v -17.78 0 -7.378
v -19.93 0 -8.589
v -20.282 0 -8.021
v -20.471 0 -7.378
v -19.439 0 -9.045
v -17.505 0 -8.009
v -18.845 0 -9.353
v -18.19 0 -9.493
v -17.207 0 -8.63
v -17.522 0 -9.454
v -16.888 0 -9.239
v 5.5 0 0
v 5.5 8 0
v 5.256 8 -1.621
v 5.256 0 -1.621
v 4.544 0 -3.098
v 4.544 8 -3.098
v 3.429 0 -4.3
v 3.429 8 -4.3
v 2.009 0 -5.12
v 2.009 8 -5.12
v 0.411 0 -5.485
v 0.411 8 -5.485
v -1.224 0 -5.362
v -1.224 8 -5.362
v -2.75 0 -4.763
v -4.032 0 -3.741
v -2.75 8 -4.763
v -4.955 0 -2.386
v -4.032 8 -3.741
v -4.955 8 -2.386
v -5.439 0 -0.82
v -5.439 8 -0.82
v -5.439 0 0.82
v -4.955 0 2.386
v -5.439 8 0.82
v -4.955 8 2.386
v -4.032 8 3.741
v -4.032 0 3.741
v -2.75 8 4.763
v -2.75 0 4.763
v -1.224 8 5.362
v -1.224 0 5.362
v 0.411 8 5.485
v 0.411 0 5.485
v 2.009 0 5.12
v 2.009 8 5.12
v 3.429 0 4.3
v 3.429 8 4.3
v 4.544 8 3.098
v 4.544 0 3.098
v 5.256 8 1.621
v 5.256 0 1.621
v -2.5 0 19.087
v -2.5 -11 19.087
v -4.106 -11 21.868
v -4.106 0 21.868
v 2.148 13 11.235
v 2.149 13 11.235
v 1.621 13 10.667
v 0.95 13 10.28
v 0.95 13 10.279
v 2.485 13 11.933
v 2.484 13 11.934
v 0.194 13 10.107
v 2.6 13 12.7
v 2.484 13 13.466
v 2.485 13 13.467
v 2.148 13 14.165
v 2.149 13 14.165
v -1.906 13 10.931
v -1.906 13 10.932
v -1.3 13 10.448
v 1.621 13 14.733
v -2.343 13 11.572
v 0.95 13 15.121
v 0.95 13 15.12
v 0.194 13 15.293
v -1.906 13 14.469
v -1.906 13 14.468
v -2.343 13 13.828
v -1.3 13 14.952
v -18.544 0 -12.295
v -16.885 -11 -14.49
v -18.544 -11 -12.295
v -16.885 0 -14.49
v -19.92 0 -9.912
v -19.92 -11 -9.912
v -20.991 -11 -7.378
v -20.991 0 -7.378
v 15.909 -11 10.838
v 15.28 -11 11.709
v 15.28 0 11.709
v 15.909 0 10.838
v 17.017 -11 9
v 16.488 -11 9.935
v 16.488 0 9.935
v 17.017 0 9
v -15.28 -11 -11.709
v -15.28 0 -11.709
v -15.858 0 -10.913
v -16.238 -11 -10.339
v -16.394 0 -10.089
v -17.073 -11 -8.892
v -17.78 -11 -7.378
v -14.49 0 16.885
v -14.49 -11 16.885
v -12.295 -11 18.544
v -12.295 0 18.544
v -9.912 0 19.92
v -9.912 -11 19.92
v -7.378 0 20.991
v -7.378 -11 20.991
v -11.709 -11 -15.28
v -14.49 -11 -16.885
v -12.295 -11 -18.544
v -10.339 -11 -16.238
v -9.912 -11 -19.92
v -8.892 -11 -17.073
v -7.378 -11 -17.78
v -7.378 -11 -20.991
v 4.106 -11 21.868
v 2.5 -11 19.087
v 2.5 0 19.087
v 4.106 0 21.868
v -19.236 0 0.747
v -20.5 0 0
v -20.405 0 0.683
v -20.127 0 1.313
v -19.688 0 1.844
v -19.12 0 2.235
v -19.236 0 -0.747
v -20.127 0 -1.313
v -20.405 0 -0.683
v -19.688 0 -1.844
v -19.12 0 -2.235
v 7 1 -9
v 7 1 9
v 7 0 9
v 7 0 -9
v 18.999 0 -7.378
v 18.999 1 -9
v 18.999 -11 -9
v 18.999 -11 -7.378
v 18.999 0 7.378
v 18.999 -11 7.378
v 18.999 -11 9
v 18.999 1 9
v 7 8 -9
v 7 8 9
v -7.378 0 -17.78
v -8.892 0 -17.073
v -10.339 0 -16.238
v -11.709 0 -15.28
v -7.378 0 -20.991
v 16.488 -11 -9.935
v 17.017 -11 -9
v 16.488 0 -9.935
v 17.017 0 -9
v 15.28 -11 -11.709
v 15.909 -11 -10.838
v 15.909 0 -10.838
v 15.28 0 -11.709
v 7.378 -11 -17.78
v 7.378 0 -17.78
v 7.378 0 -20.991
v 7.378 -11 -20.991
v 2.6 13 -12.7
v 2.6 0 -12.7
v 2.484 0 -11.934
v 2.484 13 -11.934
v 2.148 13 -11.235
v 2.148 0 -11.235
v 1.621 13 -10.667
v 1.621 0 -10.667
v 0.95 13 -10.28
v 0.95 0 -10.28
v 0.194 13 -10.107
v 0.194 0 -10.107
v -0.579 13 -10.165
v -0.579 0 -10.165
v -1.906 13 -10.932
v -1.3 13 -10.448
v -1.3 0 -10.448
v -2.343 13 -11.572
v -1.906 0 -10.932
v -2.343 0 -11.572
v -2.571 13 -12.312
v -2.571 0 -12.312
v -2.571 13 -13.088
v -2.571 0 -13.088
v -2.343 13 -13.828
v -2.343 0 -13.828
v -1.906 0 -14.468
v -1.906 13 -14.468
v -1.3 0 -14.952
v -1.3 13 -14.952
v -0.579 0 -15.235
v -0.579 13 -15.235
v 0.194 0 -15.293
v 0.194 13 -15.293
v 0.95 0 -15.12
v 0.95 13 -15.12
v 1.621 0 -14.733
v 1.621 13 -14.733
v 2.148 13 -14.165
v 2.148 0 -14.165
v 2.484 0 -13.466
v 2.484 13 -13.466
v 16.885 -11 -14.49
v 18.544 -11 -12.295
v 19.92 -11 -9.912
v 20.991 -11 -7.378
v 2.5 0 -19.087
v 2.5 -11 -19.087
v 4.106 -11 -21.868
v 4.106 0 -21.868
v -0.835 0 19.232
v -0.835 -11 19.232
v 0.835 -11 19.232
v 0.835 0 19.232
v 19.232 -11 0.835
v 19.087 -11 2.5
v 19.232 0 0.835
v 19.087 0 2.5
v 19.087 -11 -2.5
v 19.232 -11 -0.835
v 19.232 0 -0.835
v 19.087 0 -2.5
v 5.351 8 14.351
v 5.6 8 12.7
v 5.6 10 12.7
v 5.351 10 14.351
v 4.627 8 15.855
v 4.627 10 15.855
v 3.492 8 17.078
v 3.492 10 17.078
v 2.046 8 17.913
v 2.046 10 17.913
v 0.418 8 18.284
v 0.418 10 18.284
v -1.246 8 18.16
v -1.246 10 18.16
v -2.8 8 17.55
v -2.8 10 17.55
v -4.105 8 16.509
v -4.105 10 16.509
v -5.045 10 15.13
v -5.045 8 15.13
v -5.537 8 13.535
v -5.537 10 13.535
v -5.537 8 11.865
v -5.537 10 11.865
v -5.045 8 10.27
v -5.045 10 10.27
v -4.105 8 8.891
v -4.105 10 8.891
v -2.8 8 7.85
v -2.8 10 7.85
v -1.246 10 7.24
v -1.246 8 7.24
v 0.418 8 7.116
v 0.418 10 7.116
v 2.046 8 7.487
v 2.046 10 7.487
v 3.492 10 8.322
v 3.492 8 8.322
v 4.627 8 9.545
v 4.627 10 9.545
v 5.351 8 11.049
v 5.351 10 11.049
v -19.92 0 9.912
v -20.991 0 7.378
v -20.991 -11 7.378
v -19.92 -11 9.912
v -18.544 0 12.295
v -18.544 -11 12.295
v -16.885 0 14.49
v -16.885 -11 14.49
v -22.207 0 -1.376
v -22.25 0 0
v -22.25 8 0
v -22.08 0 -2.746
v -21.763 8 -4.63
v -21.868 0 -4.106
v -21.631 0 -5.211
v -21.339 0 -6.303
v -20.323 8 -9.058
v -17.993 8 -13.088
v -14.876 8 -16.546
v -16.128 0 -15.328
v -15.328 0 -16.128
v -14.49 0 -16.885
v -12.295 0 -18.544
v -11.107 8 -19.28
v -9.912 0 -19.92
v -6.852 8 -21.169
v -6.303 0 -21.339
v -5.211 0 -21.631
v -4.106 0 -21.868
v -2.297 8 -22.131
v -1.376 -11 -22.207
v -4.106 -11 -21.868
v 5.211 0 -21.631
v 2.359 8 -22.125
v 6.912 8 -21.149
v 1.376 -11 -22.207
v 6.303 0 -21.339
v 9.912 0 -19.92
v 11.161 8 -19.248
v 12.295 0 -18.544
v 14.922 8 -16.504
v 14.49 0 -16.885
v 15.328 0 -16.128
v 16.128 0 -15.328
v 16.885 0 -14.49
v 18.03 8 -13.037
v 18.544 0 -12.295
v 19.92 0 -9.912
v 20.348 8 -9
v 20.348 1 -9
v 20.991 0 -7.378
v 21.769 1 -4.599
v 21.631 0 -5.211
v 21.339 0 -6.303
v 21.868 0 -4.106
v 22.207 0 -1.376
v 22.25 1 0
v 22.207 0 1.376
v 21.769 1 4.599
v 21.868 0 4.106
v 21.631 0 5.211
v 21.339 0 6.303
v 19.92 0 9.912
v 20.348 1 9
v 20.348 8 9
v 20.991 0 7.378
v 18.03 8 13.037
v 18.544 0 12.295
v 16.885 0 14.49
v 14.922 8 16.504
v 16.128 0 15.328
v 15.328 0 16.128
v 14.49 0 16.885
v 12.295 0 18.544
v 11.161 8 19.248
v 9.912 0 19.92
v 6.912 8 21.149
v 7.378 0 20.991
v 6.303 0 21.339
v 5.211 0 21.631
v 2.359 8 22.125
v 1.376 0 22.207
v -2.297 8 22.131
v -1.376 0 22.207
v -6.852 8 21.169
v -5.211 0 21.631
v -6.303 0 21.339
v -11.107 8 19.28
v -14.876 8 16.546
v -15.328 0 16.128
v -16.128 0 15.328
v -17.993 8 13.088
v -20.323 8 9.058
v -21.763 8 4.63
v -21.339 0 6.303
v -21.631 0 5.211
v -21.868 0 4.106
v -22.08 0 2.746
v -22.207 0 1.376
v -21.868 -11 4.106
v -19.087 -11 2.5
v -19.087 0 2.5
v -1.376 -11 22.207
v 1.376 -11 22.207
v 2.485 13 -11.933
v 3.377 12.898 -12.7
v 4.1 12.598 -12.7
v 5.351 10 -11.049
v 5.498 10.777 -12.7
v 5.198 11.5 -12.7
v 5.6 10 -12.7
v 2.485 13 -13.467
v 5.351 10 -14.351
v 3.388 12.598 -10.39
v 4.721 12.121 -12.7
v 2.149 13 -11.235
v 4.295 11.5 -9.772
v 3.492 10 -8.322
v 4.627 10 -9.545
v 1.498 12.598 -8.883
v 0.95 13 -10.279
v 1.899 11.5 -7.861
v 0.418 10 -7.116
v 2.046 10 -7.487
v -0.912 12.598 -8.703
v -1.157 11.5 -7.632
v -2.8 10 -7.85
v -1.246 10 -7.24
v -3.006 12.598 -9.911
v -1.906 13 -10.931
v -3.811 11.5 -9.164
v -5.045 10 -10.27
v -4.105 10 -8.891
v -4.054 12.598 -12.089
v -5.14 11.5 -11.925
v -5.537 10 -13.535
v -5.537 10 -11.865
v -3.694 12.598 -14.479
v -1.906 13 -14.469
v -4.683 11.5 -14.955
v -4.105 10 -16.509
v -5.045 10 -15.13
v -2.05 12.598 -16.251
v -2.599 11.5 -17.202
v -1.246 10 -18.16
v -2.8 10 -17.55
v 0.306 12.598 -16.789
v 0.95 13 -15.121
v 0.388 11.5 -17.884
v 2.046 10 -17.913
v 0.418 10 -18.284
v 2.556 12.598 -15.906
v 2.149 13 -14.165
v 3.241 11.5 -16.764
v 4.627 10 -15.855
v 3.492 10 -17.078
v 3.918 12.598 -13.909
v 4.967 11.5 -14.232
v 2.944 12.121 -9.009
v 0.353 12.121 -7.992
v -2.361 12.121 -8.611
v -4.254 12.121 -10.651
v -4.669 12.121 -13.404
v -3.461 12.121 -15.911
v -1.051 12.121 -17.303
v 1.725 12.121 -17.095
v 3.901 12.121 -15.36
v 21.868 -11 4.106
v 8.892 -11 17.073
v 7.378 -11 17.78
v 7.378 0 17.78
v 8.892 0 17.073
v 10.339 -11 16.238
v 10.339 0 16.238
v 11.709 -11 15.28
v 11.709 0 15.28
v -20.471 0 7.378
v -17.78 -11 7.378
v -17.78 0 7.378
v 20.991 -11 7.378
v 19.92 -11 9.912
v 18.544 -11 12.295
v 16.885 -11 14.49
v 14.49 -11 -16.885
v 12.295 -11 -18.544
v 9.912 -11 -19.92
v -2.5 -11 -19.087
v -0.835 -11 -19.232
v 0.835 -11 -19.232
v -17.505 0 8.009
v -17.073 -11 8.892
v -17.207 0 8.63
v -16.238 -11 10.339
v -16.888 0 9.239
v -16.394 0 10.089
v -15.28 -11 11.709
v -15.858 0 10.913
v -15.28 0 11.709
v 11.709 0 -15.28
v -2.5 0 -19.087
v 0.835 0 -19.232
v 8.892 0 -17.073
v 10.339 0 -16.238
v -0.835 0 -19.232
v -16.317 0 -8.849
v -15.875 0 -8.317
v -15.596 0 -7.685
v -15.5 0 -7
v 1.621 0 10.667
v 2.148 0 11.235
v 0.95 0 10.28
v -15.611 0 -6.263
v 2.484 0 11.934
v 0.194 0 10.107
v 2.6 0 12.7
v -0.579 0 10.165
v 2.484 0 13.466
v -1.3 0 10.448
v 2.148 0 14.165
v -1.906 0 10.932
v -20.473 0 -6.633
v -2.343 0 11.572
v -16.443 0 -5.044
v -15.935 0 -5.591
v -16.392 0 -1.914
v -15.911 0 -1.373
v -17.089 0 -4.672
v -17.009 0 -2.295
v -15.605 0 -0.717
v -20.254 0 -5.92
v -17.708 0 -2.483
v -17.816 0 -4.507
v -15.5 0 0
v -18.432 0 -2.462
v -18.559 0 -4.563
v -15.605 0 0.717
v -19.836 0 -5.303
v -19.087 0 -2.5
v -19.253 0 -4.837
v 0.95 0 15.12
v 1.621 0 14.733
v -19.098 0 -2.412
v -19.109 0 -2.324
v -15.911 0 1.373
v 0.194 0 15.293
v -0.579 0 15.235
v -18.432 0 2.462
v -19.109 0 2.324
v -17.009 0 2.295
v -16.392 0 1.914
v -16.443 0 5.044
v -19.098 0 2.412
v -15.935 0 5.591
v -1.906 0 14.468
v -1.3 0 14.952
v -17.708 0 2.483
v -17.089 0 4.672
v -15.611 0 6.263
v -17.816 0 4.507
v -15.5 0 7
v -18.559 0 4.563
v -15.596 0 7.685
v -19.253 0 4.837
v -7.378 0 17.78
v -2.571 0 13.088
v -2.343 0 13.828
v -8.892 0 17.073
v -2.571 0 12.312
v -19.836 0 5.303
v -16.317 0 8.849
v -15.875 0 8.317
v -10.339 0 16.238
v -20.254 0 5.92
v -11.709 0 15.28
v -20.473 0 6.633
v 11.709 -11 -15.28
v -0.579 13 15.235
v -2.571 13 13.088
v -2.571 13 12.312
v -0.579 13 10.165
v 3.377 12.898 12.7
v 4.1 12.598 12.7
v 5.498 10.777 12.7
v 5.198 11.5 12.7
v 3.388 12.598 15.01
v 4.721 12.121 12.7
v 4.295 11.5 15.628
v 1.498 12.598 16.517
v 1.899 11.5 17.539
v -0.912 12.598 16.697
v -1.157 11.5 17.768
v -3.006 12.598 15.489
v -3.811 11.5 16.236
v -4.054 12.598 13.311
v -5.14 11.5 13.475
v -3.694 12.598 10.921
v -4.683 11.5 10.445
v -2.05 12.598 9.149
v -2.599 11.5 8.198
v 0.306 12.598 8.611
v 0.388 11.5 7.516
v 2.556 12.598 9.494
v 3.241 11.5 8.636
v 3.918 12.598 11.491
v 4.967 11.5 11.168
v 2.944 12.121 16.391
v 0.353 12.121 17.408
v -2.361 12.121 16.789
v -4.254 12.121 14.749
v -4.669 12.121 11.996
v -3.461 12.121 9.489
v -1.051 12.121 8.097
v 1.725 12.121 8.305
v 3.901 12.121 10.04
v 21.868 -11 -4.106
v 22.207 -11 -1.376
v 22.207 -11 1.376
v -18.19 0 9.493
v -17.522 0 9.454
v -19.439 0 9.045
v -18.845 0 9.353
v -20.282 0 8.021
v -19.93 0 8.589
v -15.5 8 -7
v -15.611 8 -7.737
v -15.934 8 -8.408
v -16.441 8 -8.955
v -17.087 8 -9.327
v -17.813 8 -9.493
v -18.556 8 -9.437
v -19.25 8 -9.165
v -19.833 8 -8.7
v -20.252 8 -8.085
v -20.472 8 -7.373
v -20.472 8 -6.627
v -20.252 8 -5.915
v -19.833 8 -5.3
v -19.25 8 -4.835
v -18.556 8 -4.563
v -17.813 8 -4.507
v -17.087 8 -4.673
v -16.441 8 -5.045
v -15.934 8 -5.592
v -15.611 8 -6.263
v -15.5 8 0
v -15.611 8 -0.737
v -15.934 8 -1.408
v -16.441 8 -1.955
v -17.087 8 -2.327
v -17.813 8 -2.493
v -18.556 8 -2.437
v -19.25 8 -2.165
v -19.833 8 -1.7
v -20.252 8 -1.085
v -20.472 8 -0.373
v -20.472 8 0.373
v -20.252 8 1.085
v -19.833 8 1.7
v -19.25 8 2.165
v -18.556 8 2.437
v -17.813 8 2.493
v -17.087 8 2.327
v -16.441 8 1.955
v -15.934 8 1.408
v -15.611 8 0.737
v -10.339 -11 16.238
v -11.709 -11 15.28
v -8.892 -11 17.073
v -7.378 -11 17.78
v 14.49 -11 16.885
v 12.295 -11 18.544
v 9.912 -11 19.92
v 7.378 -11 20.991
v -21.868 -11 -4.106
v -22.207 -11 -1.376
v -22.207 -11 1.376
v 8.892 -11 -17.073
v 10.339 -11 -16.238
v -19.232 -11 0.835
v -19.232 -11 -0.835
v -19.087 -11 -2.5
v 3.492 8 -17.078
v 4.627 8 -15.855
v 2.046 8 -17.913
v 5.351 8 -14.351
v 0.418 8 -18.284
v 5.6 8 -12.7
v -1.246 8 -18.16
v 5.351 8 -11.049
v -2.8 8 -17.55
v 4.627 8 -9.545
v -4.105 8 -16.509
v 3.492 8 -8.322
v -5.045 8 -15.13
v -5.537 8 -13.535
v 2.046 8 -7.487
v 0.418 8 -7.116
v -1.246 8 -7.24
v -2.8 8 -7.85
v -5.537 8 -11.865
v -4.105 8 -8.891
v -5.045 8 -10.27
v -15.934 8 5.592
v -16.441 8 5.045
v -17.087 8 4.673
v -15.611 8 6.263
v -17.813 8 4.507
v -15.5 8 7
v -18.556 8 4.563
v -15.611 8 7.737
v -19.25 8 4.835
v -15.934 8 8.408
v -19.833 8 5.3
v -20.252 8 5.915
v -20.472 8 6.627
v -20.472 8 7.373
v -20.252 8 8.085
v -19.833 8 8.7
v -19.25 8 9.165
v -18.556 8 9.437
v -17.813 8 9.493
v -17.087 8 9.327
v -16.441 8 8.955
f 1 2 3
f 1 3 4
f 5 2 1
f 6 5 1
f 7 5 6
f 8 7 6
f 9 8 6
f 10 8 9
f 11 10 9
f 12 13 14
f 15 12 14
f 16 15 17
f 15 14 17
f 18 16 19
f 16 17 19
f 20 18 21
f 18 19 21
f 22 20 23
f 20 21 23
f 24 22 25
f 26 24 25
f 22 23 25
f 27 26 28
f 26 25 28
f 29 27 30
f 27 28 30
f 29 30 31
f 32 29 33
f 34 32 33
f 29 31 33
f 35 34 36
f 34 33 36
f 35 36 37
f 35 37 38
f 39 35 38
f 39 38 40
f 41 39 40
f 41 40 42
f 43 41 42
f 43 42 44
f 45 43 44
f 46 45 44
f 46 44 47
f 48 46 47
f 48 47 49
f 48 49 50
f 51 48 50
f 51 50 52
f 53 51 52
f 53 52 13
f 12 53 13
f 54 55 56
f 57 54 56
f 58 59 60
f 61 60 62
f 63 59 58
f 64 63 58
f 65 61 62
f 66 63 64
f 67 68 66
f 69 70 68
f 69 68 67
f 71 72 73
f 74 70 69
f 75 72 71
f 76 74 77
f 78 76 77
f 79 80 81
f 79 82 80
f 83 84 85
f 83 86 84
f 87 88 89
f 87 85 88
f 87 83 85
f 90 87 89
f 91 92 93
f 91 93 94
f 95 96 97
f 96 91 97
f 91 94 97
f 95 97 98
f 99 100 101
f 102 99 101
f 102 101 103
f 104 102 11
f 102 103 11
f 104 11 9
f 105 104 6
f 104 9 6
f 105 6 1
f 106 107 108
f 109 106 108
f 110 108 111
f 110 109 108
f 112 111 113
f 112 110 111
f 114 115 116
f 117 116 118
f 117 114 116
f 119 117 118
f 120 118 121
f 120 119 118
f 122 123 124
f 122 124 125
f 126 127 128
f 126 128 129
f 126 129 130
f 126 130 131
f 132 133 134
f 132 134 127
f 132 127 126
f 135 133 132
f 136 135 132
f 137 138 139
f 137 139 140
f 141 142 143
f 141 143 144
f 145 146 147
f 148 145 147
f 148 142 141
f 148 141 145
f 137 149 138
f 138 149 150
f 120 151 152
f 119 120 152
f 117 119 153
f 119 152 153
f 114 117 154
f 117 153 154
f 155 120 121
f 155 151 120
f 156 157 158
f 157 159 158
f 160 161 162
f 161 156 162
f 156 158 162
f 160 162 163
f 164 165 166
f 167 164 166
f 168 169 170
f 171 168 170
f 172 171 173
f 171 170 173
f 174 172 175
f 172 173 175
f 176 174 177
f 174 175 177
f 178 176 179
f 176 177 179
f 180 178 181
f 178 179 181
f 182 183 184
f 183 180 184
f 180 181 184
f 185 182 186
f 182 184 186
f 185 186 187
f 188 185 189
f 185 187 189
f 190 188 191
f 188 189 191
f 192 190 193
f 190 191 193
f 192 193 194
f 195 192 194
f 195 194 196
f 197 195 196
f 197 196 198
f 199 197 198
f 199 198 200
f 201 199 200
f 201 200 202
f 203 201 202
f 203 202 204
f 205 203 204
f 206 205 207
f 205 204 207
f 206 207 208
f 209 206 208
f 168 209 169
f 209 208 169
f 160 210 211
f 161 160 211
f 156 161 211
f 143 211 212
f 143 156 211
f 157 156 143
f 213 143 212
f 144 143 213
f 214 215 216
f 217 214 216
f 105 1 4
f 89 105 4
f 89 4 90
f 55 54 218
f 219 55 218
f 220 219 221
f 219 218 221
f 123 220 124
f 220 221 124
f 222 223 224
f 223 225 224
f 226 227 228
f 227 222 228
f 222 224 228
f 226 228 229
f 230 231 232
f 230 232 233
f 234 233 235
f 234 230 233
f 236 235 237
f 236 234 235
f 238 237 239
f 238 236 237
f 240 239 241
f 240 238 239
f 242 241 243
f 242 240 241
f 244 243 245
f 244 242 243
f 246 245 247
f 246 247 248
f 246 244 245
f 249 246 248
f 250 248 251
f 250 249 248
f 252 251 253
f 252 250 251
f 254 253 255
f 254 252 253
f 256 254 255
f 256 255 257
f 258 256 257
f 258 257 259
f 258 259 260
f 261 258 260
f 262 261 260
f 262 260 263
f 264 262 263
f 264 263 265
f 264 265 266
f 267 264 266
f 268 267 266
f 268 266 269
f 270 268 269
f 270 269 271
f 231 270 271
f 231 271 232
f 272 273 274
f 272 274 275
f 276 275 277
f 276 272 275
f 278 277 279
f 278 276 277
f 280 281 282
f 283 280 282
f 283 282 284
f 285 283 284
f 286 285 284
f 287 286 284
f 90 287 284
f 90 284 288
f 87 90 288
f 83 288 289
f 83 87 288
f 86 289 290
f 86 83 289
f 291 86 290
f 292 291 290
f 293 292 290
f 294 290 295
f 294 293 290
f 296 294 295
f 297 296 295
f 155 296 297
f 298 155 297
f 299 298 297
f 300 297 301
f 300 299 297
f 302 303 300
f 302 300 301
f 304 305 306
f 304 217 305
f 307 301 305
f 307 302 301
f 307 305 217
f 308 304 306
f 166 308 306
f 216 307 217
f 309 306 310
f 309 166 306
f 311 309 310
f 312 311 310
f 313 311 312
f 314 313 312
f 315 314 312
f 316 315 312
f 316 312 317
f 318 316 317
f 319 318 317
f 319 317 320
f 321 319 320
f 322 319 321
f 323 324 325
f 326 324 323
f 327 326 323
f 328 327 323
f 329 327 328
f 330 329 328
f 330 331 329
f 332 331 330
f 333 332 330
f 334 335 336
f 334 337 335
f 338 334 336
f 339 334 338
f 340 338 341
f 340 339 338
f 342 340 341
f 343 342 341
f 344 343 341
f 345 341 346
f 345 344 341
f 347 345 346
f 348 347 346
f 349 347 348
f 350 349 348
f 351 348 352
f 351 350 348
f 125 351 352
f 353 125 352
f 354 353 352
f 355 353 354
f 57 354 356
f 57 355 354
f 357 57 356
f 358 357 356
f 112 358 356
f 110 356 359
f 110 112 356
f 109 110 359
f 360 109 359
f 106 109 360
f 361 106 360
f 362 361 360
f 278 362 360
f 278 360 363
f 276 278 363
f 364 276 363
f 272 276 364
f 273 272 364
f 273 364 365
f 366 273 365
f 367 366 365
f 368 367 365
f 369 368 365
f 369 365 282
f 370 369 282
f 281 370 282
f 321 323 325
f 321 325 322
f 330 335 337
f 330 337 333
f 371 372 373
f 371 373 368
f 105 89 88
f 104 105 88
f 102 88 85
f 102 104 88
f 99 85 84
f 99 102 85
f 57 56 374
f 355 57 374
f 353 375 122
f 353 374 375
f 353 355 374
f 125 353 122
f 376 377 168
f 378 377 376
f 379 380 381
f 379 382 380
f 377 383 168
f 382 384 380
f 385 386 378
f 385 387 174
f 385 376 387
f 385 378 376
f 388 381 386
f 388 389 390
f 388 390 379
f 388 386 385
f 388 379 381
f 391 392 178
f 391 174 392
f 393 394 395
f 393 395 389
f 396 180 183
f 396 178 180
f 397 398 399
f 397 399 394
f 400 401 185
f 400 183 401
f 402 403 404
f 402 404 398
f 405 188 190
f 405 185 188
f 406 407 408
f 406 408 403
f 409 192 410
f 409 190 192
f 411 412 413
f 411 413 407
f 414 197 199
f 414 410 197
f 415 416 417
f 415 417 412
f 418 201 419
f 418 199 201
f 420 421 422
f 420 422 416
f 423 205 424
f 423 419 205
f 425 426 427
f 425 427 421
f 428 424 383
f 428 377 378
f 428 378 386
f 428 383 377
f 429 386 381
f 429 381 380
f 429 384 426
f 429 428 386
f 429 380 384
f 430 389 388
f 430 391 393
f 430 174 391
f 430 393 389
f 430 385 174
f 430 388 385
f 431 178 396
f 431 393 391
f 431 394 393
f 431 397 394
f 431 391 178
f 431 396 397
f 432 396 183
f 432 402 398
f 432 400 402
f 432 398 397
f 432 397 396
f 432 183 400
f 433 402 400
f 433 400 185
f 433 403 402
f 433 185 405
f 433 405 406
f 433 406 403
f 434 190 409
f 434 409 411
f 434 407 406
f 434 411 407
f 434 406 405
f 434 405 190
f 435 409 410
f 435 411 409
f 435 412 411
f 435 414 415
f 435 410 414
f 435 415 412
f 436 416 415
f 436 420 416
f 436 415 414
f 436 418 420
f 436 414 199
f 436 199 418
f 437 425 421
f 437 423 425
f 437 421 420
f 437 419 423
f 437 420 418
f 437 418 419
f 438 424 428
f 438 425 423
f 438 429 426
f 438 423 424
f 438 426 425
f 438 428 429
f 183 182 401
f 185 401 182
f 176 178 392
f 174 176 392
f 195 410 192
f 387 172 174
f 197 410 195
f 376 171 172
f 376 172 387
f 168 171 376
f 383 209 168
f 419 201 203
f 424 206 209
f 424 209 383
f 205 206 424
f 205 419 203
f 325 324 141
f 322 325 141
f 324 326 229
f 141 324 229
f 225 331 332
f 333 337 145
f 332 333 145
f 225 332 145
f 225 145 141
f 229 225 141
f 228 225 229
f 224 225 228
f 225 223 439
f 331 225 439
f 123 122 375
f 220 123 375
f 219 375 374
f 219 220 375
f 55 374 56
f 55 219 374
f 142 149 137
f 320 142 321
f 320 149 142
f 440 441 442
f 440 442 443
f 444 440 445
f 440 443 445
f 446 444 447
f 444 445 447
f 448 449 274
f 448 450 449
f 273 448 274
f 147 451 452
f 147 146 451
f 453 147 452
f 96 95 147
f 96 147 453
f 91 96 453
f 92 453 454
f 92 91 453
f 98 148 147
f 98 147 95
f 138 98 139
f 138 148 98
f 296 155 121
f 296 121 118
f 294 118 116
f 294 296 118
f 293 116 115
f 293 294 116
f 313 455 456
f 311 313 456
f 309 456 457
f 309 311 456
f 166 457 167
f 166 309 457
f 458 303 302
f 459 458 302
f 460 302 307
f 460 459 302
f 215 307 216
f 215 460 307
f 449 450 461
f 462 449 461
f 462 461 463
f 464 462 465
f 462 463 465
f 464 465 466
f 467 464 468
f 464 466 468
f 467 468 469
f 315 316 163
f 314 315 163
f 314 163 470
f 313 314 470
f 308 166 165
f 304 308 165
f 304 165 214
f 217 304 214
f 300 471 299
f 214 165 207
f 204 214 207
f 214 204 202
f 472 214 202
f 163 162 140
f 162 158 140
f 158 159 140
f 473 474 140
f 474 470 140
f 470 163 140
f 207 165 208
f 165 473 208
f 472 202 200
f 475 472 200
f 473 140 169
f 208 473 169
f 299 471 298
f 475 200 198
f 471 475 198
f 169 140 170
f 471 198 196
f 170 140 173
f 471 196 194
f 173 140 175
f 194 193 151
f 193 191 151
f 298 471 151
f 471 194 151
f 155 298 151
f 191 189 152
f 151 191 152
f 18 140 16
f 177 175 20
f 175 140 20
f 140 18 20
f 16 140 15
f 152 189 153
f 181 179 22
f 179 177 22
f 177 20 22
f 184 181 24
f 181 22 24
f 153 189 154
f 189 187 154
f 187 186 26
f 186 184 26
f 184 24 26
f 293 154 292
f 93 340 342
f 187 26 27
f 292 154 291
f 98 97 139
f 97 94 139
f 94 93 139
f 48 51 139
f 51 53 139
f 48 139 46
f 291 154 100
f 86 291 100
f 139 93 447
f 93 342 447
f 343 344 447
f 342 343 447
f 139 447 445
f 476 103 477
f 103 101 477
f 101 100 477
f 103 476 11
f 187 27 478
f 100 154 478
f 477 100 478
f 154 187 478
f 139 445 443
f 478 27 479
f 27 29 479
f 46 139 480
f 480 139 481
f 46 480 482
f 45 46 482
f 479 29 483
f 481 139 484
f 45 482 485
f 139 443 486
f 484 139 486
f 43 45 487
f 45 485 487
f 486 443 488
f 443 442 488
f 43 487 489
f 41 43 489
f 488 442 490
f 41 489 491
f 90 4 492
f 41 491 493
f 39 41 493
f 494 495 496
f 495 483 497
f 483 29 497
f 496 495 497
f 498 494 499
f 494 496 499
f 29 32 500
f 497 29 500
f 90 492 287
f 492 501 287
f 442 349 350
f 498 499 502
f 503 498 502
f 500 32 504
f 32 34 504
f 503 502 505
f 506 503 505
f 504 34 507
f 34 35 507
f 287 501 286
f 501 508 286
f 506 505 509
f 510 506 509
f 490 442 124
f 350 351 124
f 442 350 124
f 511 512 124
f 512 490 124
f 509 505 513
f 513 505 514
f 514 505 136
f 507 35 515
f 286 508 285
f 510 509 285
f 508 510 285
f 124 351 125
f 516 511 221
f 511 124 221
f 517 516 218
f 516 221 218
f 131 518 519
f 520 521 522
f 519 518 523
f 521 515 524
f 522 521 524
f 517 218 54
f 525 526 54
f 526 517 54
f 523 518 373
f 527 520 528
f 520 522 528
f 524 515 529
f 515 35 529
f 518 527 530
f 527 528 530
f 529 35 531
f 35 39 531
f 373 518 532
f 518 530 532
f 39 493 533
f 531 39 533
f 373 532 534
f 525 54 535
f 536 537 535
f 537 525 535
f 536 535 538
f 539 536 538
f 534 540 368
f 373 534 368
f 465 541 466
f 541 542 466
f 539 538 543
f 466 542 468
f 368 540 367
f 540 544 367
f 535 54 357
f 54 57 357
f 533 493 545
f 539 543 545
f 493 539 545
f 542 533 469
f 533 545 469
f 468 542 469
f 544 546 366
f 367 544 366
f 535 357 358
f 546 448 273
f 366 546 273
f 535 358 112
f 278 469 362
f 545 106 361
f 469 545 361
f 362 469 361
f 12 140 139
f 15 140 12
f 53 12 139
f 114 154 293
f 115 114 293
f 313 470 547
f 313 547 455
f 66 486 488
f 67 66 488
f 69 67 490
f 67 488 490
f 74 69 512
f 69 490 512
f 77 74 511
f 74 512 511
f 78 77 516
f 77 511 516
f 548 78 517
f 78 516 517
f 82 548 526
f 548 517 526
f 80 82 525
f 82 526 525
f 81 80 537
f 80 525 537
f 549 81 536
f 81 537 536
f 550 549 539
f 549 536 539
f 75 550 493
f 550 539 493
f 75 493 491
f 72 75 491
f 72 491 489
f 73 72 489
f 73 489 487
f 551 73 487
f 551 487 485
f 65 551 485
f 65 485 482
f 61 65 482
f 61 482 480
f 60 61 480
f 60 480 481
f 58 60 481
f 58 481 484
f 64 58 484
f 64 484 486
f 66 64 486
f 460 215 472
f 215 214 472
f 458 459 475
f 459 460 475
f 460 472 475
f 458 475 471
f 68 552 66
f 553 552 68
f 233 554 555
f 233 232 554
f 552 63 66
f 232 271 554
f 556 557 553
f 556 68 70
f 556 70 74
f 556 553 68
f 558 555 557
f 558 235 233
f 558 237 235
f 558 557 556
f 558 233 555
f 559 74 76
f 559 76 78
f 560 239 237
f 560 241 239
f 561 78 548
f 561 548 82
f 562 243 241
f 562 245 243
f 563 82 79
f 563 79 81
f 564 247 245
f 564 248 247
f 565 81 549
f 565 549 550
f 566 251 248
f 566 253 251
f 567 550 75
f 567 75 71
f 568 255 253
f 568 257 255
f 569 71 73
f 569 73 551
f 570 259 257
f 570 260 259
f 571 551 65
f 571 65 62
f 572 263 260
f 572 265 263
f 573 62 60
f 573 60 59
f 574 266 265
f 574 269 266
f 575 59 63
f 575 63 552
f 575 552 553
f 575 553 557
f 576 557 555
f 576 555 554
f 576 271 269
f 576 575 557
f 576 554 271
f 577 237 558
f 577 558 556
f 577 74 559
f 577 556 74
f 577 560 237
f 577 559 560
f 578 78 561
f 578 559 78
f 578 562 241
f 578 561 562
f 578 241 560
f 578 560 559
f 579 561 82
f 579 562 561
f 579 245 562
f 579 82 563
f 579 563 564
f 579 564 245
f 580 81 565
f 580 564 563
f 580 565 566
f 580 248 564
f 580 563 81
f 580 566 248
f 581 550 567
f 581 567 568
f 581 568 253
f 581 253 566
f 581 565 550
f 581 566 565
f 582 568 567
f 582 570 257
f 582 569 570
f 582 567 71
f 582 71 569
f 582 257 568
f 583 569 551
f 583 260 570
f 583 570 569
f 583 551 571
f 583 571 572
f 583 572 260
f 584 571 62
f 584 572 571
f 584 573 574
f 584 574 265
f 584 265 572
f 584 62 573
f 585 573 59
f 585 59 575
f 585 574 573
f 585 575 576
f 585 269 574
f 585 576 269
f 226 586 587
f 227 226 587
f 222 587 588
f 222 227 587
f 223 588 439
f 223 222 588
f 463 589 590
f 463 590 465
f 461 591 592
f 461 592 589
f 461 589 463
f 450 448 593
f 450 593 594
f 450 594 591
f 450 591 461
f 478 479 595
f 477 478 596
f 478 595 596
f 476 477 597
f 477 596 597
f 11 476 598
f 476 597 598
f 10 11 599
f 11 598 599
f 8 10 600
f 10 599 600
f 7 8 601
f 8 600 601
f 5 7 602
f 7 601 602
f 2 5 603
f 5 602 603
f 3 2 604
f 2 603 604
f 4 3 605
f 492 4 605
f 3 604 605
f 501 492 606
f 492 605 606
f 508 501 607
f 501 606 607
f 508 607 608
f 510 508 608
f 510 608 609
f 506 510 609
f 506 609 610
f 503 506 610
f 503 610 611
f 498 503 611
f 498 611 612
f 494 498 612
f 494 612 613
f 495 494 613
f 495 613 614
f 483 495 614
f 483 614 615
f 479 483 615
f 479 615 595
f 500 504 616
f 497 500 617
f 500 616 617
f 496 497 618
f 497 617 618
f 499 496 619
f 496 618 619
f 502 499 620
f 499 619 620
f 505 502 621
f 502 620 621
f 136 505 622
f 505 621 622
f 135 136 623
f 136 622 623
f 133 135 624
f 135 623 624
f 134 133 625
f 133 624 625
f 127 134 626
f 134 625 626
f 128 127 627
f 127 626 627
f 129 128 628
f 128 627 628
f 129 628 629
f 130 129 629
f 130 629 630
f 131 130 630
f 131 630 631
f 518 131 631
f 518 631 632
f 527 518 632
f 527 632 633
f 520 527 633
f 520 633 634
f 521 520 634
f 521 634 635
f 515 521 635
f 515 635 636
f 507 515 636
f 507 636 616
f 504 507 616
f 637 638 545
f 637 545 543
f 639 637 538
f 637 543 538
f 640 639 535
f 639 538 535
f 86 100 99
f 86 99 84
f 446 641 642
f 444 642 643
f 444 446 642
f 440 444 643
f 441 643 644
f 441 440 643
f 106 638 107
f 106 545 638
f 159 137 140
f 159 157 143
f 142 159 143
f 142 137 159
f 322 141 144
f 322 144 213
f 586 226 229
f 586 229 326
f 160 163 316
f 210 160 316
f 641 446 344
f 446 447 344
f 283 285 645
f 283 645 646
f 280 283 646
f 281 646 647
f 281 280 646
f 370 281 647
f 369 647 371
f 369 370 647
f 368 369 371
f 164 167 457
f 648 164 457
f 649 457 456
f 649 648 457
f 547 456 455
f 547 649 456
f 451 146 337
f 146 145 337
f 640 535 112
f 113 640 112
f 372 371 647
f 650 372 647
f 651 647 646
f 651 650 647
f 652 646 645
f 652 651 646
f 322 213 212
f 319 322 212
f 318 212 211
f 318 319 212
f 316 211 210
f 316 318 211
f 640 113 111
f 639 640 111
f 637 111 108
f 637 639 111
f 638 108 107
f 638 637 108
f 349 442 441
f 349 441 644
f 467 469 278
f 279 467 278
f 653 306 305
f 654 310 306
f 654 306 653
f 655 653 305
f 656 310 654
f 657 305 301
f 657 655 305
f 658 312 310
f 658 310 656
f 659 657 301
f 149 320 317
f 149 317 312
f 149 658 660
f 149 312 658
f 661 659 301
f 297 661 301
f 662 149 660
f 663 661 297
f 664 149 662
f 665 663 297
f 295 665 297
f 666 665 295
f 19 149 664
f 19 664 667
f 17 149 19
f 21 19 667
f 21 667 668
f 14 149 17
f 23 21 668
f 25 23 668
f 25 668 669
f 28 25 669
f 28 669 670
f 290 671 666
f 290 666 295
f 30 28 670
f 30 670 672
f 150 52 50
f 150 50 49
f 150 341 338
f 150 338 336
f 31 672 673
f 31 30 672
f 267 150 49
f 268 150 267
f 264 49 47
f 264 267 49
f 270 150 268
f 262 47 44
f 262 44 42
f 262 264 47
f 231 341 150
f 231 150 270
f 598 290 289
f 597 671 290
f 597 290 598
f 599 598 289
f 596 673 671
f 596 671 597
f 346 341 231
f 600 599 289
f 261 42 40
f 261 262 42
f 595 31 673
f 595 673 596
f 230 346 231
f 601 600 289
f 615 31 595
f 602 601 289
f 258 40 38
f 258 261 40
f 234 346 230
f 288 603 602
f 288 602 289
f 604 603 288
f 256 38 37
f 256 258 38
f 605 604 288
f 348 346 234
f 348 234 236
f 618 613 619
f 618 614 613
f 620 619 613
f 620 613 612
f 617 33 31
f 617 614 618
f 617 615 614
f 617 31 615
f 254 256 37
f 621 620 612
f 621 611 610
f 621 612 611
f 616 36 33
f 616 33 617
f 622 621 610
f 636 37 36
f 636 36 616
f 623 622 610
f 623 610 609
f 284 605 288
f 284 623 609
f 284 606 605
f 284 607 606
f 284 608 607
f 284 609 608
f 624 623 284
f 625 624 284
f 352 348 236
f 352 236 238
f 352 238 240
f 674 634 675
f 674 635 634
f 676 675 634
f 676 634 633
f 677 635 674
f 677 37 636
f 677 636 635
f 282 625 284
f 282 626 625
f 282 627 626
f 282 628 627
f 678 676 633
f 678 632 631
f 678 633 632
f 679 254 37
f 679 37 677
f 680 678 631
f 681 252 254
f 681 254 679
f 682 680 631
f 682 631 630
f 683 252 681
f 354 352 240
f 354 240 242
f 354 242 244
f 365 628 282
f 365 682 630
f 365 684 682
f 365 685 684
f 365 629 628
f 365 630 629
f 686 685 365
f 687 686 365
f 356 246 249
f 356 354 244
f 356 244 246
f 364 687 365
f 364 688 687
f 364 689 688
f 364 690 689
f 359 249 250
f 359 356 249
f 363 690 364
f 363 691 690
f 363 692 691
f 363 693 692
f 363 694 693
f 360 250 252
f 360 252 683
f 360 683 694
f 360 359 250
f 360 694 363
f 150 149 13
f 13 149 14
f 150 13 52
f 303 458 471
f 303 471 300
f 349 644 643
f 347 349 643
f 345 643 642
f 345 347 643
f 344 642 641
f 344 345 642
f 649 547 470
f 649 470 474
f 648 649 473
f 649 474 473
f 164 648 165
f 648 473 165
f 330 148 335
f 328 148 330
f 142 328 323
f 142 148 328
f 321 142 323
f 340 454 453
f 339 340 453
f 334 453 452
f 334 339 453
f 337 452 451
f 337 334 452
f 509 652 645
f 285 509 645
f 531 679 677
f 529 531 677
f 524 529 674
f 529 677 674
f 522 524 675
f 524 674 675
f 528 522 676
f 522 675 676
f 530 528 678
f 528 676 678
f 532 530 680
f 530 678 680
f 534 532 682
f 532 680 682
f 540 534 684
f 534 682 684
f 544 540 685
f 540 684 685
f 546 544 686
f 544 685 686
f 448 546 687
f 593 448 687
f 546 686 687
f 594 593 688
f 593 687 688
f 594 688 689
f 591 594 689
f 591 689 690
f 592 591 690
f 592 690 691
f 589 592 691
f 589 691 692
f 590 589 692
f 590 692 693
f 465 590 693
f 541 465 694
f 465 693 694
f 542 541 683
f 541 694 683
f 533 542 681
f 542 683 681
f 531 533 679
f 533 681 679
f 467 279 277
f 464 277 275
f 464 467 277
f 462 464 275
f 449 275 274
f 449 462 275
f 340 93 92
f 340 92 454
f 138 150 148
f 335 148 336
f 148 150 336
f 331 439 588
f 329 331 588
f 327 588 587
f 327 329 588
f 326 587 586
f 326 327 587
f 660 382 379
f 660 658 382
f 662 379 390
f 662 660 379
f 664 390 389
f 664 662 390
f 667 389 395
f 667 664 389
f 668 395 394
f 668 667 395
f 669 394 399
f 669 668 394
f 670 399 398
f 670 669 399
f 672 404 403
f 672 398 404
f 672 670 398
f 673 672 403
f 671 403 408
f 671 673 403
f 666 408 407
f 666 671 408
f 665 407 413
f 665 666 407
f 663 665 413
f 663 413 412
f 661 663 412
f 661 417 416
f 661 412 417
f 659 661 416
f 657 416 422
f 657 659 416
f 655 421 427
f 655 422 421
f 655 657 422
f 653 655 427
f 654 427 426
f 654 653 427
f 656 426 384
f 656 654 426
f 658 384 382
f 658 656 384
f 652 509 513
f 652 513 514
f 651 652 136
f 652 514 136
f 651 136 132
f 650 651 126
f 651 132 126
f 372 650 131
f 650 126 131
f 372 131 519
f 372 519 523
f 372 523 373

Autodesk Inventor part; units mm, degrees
ref_plane "YZ Plane" through (0, 0, 0) normal (1, 0, 0) x (0, 1, 0)
ref_plane "XZ Plane" through (0, 0, 0) normal (0, 1, 0) x (-1, 0, 0)
ref_plane "XY Plane" through (0, 0, 0) normal (0, 0, 1) x (1, 0, 0)
sketch "Sketch1" plane through (0, 0, 0) normal (0, 1, 0) x (-1, 0, 0)
  circle A0 centre (0, 0) radius 22.25
  dimension "d0" = 44.5
extrude "Extrusion1" add sketch "Sketch1" along normal blind 8
sketch "Sketch2" plane through (0, 8, 0) normal (0, 1, 0) x (1, 0, 0)
  circle A0 centre (0, 12.7) radius 2.6
  circle A1 centre (0, -12.7) radius 2.6
  point P0 (0, 0)
  dimension "d3" = 5.2
  dimension "d4" = 12.7
  dimension "d5" = 5.2
  dimension "d6" = 12.7
extrude "Extrusion2" cut sketch "Sketch2" against normal up to surface (8 mm away)
sketch "Sketch3" plane through (0, 8, 0) normal (0, 1, 0) x (1, 0, 0)
  circle A0 centre (0, 12.7) radius 2.6 projected
  circle A1 centre (0, 12.7) radius 2.6
  circle A2 centre (0, 12.7) radius 5.6
  point P0 (0, 0)
  dimension "d9" = 3
extrude "Extrusion3" add sketch "Sketch3" along normal blind 5
mirror "Mirror1" about plane through (0, 0, 0) normal (0, 0, 1) of "Extrusion3"
sketch "Sketch4" plane through (0, 0, 0) normal (0, -1, 0) x (1, 0, 0)
  circle A0 centre (0, 0) radius 22.25 projected
  circle A1 centre (0, 0) radius 19.25
  circle A2 centre (0, 0) radius 22.25
  line L0 (2.5, -19.087) -> (-2.5, -19.087) construction
  line L1 (2.5, -19.087) -> (7.5, -19.087) construction
  line L2 (-2.5, -19.087) -> (-4.1056, -21.8679)
  line L3 (-2.5, -19.087) -> (0.7112, -19.087) construction
  line L4 (2.5, -19.087) -> (4.1056, -21.8679)
  line L5 (2.5, -19.087) -> (5.7112, -19.087) construction
  point P0 (4.1056, -21.8679)
  point P1 (-4.1056, -21.8679)
  dimension "d17" = 3
  dimension "d18" = 5
  dimension "d19" = 180
  dimension "d20" = 120
  dimension "d21" = 60
extrude "Extrusion5" add sketch "Sketch4" along normal blind 11 contours L2 A1 L4 A0 picked at (0.2785, -21.2156)
pattern_circular "Circular Pattern1" count 12 over 360 about axis through (0, -10, 0) along (0, 1, 0) of "Extrusion5"
fillet "Fillet1" radius 3 2 edges at (-5.6, 13, -12.7) (-5.6, 13, 12.7)
sketch "Sketch6" plane through (0, 8, 0) normal (0, 1, 0) x (1, 0, 0)
  circle A0 centre (0, 0) radius 22.25 projected
  circle A1 centre (0, 0) radius 22.25
  line L0 (7, 9) -> (7, -9)
  line L1 (7, 9) -> (25, 9) construction
  line L2 (7, 9) -> (20.3485, 9)
  line L3 (7, -9) -> (20.3485, -9)
  point P0 (7, 0)
  dimension "d29" = 18
  dimension "d30" = 90
  dimension "d56" = 7
extrude "Extrusion6" cut sketch "Sketch6" against normal blind 7 contours A0 L3 L0 L2 picked at (12.0833, 0)
sketch "Sketch7" plane through (0, 8, 0) normal (0, 1, 0) x (1, 0, 0)
  circle A0 centre (0, 0) radius 19.25 construction
  arc A1 (20.3485, 9) -> (20.3485, -9) centre (0, 0) ccw construction
  circle A2 centre (3, 7) radius 2.5
  arc A3 (4.1056, 21.8679) -> (-4.1056, 21.8679) centre (0, 0) ccw construction
  line L0 (0, 22.25) -> (0, -22.25) construction
  arc A4 (-4.1056, -21.8679) -> (4.1056, -21.8679) centre (0, 0) ccw construction
  line L1 (22.25, 0) -> (-22.25, 0) construction
  arc A5 (-21.8679, 4.1056) -> (-21.8679, -4.1056) centre (0, 0) ccw construction
  line L2 (7, -9) -> (7, 9) construction
  circle A6 centre (3, 0) radius 2.5
  circle A7 centre (3, -7) radius 2.5
  circle A8 centre (0, 0) radius 5.5
  circle A9 centre (-18, 7) radius 2.5
  circle A10 centre (-18, 0) radius 2.5
  circle A11 centre (-18, -7) radius 2.5
  dimension "d34" = 3
  dimension "d35" = 5
  dimension "d36" = 4
  dimension "d39" = 7
  dimension "d44" = 11
  dimension "d45" = 5
  dimension "d48" = 7
  dimension "d53" = 21
extrude "Extrusion7" cut sketch "Sketch7" against normal up to surface (8 mm away) contours A8 A2 | A6 | A2 A8 A7 | A7 A8 | A9 | A10 | A11 picked at (2.1127, 4.9296) picked at (2.1127, -4.9296)
sketch "Sketch9" plane through (0, 1, 0) normal (0, 1, 0) x (1, 0, 0)
  line L0 (7, -9) -> (7, 9) projected
  line L1 (20.3485, -9) -> (7, -9) projected
  line L2 (7, 9) -> (18.9991, 9)
  line L3 (18.9991, 9) -> (18.9991, -9)
  line L4 (18.9991, -9) -> (7, -9)
  line L5 (7, -9) -> (7, 9)
  point P0 (0, 0)
extrude "Extrusion8" cut sketch "Sketch9" against normal through all
equation "\"d5\" = d3"
equation "\"d6\" = d4"
equation "\"d34\" = d17"
equation "\"d45\" = d35"
properties part number "spacer"
